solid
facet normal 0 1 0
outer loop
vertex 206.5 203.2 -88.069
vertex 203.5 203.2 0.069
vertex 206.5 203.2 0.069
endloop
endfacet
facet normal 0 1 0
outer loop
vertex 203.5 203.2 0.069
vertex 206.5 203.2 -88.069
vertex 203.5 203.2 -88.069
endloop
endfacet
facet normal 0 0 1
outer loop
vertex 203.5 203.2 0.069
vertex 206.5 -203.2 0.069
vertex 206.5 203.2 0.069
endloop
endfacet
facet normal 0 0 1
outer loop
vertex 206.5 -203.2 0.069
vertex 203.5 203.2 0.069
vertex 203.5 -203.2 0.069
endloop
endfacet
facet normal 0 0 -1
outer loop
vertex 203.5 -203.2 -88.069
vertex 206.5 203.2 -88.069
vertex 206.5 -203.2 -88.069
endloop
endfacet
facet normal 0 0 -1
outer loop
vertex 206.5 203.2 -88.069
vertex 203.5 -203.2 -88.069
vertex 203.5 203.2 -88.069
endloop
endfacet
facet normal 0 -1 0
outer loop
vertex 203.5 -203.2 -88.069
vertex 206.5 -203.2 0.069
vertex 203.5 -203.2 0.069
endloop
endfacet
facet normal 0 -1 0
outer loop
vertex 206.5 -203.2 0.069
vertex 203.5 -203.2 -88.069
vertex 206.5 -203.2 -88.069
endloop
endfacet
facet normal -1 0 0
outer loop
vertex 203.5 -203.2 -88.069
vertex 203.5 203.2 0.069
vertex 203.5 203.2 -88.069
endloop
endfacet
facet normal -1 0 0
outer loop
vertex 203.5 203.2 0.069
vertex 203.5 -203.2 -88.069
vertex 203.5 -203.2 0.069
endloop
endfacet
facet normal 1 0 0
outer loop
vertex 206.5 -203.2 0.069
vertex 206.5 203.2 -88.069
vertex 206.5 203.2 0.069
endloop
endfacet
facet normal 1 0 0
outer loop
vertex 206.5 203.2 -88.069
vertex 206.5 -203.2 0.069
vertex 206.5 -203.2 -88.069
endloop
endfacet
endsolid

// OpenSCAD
module sideleftpanel()
{
	difference() 
	{
		union() 
		{
			color("grey")
			translate([205,0,-44])
			rotate(90) cube(size=[406.4, 3, 88.138], center = true, $fs=.01);
		}
		union() 
		{

		}
	}
}

sideleftpanel();
